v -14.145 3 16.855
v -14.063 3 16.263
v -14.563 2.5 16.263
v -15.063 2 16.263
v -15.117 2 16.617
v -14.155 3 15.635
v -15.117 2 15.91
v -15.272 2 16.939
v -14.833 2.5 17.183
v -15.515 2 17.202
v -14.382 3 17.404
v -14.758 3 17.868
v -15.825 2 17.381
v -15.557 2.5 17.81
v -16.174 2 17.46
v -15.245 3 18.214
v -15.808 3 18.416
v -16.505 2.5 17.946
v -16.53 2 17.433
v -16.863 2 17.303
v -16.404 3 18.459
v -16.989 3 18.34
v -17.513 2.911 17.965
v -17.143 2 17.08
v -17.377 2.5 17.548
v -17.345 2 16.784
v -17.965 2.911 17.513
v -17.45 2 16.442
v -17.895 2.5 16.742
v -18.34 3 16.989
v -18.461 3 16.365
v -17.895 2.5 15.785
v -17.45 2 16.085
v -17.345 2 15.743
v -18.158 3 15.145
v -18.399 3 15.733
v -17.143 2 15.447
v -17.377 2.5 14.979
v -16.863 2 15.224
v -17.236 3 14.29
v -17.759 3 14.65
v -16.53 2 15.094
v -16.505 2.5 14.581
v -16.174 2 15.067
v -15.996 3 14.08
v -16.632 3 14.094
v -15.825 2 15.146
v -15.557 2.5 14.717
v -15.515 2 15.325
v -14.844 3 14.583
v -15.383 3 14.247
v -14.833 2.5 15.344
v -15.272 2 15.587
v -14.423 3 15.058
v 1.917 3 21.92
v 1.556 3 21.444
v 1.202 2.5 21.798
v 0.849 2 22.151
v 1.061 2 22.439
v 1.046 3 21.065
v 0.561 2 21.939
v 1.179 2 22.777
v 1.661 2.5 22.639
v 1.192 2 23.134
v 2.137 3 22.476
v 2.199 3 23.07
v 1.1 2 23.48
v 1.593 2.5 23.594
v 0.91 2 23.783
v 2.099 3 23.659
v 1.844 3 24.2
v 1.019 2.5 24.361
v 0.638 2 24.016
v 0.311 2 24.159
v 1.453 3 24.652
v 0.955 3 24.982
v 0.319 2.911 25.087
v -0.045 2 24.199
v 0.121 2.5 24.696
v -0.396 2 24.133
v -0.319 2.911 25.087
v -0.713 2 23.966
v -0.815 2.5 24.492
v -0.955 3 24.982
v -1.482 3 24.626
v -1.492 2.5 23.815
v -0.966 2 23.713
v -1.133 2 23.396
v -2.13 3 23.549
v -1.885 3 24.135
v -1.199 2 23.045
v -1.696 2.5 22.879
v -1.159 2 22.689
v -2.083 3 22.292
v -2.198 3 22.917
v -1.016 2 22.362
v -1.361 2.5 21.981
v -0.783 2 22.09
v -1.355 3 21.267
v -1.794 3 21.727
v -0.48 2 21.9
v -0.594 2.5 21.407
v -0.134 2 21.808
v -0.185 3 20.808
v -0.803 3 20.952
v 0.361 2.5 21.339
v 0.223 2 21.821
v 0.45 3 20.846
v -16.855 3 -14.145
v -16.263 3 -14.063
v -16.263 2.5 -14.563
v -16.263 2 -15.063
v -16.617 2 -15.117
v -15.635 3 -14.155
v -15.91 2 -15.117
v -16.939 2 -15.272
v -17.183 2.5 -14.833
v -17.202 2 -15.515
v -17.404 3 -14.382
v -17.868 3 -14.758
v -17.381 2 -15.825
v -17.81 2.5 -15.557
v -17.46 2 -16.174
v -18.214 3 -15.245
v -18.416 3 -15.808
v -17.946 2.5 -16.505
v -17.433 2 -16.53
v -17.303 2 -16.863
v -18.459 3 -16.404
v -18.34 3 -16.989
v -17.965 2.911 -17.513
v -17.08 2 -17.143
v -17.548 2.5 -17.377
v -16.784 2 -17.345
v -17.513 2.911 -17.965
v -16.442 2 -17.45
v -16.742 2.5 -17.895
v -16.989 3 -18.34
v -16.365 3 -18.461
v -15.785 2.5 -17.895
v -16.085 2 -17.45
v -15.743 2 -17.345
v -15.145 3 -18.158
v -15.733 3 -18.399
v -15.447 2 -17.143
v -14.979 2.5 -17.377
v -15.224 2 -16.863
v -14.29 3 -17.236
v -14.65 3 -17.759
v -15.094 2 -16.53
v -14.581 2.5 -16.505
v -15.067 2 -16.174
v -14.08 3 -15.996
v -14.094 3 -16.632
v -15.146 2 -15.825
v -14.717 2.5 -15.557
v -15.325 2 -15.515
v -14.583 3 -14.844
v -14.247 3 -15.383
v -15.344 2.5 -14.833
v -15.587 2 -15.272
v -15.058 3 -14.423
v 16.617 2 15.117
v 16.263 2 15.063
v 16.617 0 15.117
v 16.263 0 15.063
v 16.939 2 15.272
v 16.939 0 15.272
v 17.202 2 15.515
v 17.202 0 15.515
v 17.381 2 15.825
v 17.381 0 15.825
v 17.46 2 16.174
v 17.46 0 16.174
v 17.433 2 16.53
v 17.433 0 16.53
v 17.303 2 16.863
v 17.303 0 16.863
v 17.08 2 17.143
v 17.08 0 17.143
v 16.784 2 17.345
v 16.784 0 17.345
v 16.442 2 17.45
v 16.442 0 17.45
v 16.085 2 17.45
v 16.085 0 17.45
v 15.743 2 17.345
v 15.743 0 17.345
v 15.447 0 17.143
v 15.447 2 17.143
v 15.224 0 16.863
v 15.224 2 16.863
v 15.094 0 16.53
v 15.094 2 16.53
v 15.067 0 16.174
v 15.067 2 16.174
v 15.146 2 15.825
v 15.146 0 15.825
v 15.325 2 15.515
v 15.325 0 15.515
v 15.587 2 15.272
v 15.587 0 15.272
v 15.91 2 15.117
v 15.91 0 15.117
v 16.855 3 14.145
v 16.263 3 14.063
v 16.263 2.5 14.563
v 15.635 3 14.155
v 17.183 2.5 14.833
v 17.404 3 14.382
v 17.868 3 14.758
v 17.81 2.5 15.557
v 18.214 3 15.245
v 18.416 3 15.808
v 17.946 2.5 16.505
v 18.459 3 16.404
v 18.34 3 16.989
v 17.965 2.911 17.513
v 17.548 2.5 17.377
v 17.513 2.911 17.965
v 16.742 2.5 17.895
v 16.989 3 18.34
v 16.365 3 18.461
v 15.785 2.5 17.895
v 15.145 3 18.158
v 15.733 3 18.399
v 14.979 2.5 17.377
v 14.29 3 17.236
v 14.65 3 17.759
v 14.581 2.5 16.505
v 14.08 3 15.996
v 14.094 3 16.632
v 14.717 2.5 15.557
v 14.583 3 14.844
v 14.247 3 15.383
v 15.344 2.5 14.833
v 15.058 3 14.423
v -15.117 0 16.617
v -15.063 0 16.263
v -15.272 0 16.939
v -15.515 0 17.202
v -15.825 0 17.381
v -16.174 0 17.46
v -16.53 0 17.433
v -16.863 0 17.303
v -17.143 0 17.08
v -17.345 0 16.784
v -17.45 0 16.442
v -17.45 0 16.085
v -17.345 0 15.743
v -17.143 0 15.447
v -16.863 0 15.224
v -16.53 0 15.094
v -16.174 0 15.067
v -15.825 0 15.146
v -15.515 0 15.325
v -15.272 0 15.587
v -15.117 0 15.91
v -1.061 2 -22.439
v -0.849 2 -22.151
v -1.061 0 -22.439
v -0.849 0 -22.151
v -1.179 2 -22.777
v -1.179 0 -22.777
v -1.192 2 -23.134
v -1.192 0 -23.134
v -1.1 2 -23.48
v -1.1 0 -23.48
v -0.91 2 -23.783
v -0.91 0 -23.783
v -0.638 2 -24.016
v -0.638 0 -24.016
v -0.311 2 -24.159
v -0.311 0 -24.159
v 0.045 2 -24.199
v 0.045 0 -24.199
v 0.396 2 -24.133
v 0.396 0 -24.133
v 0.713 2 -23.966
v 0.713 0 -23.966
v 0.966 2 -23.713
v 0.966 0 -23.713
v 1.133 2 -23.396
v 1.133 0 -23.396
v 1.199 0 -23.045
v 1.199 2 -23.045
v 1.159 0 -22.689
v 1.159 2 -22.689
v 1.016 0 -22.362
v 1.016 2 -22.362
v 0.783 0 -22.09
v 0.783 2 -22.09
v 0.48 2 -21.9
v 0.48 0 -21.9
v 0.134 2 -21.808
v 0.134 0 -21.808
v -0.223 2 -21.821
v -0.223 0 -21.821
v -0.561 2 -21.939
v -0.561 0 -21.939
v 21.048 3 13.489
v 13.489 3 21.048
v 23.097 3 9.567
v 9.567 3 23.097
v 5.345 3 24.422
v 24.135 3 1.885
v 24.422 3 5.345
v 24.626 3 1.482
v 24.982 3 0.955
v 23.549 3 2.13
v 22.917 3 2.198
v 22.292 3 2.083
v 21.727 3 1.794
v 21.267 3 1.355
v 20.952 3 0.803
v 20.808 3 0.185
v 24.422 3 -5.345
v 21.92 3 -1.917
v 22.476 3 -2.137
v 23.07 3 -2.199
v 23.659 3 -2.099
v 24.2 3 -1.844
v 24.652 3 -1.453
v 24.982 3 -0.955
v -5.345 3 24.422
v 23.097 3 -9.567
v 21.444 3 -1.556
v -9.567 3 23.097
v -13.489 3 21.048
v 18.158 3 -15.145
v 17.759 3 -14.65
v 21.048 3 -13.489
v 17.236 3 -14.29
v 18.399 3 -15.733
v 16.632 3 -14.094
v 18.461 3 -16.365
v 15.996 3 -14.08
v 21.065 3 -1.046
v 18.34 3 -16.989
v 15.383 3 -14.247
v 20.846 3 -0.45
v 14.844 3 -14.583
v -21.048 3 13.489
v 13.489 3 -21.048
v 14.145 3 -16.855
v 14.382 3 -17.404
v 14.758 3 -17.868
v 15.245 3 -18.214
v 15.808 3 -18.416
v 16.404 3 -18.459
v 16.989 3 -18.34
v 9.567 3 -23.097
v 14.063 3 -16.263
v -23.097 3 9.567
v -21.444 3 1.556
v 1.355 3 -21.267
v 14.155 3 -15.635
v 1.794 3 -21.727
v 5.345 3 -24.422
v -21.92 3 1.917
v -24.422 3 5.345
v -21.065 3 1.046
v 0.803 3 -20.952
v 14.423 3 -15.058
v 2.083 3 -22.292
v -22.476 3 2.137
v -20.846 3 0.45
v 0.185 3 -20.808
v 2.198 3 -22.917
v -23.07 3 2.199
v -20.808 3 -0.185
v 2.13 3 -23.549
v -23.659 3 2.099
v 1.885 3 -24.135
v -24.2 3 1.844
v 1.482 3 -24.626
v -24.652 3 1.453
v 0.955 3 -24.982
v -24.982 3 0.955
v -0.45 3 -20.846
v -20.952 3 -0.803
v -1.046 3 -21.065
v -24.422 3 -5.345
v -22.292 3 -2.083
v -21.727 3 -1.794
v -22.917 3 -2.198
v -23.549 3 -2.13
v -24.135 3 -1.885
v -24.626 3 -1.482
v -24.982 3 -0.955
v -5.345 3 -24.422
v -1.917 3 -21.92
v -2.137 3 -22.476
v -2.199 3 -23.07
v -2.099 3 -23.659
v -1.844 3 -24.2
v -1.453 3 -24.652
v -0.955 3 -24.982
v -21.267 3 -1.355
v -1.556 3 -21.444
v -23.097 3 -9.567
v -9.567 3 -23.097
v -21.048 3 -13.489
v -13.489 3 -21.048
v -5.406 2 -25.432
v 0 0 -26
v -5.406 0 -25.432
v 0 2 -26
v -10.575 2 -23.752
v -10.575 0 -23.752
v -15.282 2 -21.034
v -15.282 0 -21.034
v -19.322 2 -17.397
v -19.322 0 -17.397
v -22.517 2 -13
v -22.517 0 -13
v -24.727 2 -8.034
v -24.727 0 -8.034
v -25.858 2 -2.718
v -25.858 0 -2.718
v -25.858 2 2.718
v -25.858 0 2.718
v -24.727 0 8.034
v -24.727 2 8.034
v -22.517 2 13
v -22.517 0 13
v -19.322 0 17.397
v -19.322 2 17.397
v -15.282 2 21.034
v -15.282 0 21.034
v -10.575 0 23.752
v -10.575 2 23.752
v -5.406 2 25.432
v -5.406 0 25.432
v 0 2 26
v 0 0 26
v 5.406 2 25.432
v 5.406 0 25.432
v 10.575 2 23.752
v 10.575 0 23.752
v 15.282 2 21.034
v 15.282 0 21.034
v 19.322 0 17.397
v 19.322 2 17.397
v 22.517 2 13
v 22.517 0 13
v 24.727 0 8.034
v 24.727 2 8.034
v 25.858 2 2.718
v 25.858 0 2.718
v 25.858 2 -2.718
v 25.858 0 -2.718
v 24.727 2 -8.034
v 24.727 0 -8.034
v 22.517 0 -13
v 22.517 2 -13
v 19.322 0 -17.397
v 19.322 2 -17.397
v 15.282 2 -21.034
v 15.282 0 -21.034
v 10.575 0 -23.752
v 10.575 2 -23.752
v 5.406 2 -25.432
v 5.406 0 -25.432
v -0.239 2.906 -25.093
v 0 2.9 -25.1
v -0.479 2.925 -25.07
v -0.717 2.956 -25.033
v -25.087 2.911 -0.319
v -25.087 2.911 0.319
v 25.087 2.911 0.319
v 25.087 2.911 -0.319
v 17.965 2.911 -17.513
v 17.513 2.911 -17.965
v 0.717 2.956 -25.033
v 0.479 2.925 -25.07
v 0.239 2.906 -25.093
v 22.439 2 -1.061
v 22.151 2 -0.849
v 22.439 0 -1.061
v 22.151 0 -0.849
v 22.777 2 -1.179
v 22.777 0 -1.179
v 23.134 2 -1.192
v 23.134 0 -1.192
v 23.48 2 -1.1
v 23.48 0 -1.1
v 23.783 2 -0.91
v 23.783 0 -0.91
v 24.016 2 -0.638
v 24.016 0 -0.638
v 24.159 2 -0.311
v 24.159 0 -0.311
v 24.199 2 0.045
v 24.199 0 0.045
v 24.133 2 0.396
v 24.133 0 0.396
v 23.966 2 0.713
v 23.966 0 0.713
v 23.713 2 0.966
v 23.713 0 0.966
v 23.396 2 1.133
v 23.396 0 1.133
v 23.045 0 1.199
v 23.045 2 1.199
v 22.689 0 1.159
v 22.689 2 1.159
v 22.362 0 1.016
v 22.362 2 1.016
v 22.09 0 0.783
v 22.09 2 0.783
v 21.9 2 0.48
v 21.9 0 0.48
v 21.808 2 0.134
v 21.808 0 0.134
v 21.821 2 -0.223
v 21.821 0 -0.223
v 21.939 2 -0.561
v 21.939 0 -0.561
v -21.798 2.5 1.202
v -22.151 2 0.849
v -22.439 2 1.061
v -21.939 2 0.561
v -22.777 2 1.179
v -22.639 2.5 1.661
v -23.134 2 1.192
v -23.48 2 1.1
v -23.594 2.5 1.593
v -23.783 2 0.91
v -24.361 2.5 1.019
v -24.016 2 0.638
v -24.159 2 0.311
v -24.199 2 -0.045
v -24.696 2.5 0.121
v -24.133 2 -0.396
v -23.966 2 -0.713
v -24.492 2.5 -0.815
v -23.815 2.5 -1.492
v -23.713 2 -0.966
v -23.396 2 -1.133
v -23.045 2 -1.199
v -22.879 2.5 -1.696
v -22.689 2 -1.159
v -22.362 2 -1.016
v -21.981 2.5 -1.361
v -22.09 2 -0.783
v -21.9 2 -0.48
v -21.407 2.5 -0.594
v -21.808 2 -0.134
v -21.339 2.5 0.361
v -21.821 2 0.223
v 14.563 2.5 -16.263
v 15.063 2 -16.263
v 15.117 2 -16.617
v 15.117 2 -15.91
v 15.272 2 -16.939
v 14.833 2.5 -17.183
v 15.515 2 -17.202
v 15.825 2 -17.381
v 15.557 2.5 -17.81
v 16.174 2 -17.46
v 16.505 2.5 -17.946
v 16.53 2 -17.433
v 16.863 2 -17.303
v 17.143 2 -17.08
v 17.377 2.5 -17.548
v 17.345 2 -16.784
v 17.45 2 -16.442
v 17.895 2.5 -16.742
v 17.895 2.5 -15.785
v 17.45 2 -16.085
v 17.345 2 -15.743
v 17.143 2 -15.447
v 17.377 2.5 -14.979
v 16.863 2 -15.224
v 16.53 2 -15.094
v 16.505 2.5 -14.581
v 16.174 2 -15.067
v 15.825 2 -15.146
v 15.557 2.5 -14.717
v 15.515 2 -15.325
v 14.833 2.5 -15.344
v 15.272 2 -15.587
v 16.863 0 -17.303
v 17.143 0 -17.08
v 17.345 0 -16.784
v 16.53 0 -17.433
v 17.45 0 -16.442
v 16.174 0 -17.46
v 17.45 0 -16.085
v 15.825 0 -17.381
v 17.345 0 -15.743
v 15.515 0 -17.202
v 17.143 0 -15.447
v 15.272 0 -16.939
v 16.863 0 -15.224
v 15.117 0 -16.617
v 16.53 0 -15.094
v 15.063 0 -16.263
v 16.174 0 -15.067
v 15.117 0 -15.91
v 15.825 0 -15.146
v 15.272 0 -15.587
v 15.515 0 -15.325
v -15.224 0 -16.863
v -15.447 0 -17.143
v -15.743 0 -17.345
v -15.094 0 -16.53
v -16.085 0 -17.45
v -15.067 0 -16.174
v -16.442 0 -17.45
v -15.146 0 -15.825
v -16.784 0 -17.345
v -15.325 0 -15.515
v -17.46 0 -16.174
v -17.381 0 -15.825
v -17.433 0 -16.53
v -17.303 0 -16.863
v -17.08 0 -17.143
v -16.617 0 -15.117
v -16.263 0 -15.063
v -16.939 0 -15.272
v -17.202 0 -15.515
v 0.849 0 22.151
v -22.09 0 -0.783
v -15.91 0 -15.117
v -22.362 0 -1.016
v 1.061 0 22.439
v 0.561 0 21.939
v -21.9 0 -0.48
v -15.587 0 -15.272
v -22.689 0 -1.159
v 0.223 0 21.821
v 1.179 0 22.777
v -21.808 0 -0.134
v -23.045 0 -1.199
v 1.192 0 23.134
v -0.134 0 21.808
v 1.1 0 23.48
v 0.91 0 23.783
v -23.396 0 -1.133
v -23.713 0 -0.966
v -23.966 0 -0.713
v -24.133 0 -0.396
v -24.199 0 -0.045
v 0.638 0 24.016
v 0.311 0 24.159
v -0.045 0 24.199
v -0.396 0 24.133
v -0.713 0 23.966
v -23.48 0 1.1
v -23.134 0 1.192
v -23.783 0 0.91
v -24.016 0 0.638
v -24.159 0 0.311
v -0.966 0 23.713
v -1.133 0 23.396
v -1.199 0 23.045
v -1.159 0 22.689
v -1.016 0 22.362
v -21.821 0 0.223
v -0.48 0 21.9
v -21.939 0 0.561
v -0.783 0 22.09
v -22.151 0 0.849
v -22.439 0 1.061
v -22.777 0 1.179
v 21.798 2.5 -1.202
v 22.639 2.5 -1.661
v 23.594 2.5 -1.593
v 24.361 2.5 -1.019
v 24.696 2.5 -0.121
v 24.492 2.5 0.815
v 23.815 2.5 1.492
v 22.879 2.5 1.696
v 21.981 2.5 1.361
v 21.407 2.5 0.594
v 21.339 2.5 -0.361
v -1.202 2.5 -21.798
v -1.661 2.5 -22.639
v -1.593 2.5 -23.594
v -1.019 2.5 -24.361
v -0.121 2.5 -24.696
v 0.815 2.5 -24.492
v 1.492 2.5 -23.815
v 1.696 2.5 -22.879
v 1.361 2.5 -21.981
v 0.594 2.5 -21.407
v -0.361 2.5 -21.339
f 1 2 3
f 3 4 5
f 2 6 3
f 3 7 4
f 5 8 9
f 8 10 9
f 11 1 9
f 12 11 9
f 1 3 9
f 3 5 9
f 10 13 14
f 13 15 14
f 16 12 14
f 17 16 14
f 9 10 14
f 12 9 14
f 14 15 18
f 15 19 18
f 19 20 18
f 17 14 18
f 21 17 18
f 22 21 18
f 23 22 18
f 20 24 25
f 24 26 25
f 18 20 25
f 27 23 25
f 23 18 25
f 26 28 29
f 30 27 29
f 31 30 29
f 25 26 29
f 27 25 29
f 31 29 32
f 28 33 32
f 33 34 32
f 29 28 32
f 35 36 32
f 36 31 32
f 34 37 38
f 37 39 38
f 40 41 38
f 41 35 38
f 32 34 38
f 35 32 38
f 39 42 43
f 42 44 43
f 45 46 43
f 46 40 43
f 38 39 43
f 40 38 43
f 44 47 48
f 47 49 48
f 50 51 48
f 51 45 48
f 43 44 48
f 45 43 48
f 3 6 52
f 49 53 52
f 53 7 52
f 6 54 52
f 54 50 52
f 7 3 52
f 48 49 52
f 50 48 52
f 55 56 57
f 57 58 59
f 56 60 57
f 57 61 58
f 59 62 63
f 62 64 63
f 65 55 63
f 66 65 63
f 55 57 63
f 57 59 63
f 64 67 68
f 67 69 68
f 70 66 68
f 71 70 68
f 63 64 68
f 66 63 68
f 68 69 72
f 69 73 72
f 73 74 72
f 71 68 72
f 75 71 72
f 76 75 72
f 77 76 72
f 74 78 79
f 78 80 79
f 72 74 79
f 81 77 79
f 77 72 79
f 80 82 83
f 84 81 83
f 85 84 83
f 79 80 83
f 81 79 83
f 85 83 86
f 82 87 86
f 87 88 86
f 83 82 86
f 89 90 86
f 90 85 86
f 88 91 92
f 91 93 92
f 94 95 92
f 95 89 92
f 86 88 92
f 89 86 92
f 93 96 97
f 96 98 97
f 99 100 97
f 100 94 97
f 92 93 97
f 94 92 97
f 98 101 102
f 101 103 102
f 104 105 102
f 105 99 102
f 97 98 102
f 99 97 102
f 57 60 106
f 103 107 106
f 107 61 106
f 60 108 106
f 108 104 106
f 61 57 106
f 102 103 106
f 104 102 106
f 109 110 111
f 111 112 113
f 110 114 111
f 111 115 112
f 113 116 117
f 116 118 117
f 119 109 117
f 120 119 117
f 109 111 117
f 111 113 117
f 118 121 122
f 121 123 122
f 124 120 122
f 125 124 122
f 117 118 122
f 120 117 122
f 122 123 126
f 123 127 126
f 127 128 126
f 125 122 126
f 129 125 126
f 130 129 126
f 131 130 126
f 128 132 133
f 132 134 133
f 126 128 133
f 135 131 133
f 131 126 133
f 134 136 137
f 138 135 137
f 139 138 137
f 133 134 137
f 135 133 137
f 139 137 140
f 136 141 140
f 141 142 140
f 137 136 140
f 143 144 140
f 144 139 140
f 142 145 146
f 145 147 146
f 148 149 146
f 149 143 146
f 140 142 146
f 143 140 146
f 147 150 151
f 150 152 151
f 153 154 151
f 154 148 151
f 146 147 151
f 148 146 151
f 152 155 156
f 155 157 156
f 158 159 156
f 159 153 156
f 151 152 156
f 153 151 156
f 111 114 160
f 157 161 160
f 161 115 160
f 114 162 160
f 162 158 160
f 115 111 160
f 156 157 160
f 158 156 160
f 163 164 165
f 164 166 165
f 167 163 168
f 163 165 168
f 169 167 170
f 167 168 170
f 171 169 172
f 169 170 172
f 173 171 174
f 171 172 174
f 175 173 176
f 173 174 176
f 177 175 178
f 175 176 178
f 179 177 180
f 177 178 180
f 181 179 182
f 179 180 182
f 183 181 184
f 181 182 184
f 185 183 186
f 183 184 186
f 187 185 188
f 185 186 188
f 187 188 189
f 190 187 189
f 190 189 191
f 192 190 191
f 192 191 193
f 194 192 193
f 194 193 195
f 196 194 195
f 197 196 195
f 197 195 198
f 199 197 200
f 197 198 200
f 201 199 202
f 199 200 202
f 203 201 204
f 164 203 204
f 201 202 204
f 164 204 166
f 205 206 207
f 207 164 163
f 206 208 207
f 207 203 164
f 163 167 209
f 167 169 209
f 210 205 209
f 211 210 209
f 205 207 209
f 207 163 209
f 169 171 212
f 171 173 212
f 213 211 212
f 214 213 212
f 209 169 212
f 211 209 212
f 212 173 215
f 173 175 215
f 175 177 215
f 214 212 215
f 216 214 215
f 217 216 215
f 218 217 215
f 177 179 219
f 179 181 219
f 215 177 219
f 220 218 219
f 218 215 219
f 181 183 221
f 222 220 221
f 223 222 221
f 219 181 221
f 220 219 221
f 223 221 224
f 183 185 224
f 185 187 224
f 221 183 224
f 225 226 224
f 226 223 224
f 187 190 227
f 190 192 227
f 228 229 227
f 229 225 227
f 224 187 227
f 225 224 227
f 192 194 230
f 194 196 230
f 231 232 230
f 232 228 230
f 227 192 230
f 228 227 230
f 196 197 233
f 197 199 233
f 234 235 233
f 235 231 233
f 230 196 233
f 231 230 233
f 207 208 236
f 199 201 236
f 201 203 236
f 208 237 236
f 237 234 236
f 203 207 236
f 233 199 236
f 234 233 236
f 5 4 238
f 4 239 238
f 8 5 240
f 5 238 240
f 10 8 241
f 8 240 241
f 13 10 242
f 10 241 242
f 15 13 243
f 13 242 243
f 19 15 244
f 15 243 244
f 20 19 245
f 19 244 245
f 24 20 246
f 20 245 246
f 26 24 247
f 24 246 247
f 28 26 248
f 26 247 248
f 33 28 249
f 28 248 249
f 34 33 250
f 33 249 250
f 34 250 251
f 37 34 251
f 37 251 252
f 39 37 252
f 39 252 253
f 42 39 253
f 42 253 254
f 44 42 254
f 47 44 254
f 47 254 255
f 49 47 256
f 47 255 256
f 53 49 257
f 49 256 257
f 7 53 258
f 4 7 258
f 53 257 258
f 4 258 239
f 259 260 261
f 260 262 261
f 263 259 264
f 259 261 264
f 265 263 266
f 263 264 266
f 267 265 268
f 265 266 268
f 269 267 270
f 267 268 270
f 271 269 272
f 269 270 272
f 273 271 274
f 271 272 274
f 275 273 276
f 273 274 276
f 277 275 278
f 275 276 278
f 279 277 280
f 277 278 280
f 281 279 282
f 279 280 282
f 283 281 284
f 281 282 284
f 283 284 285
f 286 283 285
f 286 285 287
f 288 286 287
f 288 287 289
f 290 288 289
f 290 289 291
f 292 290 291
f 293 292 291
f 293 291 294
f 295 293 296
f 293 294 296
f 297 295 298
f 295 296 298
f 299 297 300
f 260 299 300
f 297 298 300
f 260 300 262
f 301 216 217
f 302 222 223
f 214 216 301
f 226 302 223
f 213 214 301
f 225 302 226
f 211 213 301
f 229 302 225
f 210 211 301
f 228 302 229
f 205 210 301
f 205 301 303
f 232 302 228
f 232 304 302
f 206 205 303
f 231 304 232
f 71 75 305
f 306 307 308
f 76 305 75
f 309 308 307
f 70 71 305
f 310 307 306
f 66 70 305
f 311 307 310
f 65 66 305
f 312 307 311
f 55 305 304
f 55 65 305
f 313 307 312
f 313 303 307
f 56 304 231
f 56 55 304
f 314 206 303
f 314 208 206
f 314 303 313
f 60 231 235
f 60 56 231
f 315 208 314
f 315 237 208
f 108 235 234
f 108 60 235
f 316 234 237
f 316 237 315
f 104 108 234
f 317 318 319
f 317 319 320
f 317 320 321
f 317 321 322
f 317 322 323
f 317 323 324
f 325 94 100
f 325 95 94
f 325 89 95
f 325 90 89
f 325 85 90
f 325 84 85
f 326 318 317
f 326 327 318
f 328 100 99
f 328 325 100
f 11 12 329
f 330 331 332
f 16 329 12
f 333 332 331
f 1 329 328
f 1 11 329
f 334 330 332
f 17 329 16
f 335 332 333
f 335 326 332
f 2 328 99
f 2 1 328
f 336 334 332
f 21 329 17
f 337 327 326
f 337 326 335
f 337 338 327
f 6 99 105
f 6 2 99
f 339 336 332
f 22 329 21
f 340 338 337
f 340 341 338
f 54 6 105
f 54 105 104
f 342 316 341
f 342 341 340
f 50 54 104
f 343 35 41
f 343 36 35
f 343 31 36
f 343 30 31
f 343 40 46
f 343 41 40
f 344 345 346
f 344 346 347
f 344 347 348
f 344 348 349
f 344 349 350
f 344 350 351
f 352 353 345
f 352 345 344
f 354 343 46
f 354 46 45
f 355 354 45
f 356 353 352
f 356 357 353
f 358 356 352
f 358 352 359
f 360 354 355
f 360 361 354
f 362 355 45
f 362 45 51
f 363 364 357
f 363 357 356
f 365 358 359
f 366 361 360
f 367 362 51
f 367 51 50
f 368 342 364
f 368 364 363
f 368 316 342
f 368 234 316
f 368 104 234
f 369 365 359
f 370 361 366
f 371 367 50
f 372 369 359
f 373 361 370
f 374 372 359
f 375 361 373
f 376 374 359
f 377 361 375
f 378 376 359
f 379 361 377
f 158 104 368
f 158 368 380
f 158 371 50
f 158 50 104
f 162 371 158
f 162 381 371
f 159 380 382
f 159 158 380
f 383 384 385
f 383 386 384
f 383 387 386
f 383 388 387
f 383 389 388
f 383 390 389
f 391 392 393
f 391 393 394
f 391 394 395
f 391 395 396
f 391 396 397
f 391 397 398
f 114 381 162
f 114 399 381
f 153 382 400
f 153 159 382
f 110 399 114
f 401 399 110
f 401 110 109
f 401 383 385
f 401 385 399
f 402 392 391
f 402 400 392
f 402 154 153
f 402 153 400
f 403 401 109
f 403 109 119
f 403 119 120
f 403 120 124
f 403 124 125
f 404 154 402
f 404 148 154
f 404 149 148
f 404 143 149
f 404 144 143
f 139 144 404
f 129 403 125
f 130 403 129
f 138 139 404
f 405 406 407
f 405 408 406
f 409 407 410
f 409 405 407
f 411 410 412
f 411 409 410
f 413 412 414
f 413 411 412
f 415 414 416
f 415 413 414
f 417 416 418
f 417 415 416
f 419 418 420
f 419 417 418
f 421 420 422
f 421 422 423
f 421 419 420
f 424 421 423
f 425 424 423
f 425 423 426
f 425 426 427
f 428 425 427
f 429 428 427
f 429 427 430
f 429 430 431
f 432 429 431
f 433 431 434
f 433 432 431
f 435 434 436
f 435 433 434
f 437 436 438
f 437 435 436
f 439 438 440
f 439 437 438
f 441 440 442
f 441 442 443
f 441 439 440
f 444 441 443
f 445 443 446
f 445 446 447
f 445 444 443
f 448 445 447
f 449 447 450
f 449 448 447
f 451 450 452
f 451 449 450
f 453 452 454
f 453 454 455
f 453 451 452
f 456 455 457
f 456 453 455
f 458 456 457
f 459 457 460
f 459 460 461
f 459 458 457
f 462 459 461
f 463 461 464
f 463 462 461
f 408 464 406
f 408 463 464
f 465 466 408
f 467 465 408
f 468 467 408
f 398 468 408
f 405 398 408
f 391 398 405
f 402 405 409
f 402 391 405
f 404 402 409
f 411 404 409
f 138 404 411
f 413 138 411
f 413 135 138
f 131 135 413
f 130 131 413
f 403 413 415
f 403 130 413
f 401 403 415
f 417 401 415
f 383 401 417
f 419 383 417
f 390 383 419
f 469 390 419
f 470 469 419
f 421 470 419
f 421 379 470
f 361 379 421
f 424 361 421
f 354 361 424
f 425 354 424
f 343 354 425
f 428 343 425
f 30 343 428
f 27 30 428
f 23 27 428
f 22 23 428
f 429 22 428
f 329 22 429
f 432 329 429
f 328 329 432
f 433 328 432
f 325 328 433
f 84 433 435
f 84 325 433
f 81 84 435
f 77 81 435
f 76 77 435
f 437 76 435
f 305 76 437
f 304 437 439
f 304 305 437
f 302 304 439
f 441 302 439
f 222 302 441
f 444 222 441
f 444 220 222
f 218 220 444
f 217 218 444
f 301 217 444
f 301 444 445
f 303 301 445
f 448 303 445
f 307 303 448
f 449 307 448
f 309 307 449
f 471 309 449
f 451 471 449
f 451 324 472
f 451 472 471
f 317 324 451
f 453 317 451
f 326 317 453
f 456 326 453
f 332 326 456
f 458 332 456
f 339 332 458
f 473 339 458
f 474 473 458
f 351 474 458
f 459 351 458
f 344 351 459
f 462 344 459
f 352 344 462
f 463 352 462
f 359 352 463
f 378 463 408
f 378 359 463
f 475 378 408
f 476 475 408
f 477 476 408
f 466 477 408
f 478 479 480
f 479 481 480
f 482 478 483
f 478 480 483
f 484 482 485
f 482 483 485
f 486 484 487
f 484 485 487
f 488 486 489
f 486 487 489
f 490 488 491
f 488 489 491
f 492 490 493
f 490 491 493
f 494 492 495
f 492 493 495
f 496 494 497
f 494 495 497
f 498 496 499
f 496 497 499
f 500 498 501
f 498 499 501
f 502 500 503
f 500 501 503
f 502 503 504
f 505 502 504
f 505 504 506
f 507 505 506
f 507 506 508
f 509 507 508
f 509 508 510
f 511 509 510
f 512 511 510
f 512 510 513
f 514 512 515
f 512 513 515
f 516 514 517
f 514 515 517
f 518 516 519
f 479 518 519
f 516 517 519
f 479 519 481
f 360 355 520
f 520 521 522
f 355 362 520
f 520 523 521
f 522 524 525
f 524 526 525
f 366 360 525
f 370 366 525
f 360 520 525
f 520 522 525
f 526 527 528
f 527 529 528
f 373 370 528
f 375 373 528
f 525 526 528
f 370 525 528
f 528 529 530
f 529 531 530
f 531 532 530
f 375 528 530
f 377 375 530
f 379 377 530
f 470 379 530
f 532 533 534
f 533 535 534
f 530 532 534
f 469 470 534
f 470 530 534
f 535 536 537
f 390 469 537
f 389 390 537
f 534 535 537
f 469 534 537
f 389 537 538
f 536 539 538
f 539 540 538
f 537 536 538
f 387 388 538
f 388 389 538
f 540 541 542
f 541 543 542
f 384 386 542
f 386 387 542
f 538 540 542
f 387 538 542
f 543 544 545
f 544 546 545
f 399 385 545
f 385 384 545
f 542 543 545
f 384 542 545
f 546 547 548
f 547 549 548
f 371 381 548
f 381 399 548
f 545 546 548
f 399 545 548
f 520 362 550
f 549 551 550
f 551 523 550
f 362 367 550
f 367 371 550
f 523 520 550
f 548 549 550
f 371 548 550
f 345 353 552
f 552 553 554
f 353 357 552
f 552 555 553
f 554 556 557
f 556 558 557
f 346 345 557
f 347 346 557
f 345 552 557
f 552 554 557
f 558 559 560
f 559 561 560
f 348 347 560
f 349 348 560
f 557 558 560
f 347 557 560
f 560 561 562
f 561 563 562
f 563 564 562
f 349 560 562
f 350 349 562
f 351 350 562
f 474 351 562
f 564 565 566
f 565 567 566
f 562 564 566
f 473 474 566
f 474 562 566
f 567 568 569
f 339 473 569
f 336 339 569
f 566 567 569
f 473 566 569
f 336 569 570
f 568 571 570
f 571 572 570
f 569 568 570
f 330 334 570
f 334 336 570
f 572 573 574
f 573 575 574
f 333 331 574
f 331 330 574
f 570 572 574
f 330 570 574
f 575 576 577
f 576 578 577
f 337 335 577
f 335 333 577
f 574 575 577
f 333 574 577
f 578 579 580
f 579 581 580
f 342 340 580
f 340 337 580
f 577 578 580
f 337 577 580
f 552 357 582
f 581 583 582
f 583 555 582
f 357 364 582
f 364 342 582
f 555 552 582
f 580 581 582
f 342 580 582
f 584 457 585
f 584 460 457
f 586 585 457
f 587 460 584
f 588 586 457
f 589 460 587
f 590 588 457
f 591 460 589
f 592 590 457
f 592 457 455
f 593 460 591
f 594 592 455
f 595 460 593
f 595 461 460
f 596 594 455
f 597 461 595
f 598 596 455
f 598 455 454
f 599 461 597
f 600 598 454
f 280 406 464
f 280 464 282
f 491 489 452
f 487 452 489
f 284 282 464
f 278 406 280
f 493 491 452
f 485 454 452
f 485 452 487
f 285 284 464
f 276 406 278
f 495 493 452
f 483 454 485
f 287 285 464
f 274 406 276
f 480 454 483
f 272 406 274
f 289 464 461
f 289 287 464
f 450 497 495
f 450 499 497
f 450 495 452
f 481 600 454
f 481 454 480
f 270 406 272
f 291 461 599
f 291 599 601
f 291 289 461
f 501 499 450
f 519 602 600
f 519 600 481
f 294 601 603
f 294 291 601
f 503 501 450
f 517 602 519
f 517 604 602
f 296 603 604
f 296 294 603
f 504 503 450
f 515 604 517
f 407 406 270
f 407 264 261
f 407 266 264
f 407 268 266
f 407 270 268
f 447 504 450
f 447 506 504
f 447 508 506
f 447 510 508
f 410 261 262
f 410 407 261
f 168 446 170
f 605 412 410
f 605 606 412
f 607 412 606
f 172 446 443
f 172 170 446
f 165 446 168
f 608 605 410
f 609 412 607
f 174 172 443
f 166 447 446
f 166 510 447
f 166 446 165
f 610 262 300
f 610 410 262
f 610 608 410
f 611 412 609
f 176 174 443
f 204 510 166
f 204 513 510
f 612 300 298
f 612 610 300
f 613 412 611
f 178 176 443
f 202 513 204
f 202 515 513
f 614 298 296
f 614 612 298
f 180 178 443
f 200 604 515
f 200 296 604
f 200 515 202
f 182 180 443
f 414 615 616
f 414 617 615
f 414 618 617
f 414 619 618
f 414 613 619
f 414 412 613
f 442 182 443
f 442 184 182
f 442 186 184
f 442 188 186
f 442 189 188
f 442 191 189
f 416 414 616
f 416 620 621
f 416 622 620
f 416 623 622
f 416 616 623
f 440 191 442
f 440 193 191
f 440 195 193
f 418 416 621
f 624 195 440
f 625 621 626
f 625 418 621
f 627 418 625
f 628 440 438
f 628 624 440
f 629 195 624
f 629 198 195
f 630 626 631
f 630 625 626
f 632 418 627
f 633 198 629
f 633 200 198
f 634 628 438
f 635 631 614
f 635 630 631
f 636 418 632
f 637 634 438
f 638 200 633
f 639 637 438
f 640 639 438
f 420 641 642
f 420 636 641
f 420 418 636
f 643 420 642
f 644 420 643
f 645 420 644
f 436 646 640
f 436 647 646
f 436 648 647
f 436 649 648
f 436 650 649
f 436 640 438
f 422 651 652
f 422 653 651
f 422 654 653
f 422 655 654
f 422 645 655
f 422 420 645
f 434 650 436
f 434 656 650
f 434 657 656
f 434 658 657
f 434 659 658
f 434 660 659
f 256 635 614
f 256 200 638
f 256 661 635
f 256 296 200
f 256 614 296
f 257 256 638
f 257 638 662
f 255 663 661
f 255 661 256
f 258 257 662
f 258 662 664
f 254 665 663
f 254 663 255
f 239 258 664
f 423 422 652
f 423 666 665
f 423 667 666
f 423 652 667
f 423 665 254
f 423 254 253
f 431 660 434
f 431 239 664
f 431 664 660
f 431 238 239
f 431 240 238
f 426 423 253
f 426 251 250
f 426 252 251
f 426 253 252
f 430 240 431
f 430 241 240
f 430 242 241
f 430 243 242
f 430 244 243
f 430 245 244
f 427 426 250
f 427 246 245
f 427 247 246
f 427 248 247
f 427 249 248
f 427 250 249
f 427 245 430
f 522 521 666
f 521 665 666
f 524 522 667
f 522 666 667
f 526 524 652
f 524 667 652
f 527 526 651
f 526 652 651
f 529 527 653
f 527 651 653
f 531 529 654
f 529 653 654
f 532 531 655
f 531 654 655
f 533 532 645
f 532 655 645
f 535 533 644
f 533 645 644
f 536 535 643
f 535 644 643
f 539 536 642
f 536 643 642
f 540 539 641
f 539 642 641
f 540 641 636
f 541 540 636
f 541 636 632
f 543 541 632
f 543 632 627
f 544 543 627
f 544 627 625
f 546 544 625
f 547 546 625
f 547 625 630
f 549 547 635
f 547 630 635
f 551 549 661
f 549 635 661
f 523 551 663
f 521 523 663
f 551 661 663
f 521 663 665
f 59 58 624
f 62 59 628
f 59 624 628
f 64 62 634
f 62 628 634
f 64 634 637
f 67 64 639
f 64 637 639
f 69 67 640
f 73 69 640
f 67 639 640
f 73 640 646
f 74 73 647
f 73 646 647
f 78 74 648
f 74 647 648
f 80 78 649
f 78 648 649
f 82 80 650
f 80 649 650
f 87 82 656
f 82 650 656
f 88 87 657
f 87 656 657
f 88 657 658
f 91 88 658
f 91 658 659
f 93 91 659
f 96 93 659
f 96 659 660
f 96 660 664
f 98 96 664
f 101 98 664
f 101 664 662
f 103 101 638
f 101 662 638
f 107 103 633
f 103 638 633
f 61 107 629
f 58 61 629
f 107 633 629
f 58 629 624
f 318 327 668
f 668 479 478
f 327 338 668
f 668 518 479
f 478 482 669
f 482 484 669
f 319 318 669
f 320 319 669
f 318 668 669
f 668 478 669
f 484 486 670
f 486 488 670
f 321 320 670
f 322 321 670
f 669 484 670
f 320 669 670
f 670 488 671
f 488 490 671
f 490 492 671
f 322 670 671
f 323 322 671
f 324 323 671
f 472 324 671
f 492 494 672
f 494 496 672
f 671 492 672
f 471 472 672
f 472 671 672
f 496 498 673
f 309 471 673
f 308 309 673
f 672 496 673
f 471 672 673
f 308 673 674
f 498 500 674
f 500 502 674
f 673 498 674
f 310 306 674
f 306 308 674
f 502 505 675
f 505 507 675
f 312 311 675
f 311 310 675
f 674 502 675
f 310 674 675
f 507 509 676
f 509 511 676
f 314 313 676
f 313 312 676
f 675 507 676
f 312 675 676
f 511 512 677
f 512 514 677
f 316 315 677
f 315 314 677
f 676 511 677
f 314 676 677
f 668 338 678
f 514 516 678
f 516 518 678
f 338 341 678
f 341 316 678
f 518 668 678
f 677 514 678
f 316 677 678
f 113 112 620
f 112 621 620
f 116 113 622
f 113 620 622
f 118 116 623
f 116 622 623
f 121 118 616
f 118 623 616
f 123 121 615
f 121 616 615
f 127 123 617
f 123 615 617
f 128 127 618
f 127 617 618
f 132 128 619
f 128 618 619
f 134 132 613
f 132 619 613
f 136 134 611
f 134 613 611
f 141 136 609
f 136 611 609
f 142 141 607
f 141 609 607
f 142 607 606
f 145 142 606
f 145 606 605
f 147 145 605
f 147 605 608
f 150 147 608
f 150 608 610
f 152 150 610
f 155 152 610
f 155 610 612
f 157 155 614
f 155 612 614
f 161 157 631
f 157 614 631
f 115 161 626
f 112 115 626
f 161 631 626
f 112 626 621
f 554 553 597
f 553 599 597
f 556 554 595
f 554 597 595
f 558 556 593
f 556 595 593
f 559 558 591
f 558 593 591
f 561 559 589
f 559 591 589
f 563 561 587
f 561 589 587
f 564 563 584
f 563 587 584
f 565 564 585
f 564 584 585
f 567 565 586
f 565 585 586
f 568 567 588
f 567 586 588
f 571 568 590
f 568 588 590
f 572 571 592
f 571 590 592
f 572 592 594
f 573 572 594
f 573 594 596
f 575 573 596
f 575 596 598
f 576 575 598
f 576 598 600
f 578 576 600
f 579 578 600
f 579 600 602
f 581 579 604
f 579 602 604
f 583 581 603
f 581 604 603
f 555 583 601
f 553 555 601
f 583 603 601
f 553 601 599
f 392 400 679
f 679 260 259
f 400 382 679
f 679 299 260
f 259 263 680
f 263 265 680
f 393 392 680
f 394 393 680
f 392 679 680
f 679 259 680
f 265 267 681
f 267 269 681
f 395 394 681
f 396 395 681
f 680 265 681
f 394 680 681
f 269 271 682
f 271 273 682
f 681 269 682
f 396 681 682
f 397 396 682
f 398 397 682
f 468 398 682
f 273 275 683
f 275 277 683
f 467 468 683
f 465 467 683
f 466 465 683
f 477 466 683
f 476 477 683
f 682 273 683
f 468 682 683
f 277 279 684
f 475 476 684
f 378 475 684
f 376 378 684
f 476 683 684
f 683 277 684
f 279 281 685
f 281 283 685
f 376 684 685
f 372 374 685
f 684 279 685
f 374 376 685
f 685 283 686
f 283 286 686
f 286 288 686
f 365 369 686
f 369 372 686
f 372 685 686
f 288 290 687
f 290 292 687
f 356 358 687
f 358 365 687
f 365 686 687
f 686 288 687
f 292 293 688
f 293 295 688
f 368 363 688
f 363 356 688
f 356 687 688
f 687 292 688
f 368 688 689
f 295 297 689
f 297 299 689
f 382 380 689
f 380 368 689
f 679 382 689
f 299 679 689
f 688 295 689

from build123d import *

# Parameters (mm, degrees)
HOLE_WIZARD_M21_D           = 2.4
HOLE_WIZARD_M21_CSINK_D     = 4.4
HOLE_WIZARD_M21_CSINK_ANGLE = 90
PATTERN_CIRCULAR_1_COUNT    = 8


with BuildPart() as part:
    # Эскиз1 → Повернуть1 (revolve)
    with BuildSketch(Plane.XY, mode=Mode.PRIVATE) as revolve_1_sk:
        Polygon((0, 0), (26, 0), (26, 2), (25, 3), (0, 3), align=None)
    revolve(revolve_1_sk.sketch.rotate(Axis((0, 0, 0), (0, 1, 0)), 90), axis=Axis((0, 0, 0), (0, 1, 0)))

    # Зенковка для винта с потайной головкой M21 (through all)
    with Locations(Plane(origin=(0, 3, 0), x_dir=(1, 0, 0), z_dir=(0, 1, 0))):
        with Locations((16.263455967, 16.263455967)):
            hole_wizard_m21 = CounterSinkHole(HOLE_WIZARD_M21_D / 2, HOLE_WIZARD_M21_CSINK_D / 2, counter_sink_angle=HOLE_WIZARD_M21_CSINK_ANGLE)

    # Круговой массив1: Зенковка для винта с потайной головкой M21 ×8 about axis
    pattern_circular_1_axis = Axis((0, 0, 0), (0, 1, 0))
    for i in range(1, PATTERN_CIRCULAR_1_COUNT):
        add(hole_wizard_m21.rotate(pattern_circular_1_axis, i * 360 / PATTERN_CIRCULAR_1_COUNT), mode=Mode.SUBTRACT)


solid = part.part
